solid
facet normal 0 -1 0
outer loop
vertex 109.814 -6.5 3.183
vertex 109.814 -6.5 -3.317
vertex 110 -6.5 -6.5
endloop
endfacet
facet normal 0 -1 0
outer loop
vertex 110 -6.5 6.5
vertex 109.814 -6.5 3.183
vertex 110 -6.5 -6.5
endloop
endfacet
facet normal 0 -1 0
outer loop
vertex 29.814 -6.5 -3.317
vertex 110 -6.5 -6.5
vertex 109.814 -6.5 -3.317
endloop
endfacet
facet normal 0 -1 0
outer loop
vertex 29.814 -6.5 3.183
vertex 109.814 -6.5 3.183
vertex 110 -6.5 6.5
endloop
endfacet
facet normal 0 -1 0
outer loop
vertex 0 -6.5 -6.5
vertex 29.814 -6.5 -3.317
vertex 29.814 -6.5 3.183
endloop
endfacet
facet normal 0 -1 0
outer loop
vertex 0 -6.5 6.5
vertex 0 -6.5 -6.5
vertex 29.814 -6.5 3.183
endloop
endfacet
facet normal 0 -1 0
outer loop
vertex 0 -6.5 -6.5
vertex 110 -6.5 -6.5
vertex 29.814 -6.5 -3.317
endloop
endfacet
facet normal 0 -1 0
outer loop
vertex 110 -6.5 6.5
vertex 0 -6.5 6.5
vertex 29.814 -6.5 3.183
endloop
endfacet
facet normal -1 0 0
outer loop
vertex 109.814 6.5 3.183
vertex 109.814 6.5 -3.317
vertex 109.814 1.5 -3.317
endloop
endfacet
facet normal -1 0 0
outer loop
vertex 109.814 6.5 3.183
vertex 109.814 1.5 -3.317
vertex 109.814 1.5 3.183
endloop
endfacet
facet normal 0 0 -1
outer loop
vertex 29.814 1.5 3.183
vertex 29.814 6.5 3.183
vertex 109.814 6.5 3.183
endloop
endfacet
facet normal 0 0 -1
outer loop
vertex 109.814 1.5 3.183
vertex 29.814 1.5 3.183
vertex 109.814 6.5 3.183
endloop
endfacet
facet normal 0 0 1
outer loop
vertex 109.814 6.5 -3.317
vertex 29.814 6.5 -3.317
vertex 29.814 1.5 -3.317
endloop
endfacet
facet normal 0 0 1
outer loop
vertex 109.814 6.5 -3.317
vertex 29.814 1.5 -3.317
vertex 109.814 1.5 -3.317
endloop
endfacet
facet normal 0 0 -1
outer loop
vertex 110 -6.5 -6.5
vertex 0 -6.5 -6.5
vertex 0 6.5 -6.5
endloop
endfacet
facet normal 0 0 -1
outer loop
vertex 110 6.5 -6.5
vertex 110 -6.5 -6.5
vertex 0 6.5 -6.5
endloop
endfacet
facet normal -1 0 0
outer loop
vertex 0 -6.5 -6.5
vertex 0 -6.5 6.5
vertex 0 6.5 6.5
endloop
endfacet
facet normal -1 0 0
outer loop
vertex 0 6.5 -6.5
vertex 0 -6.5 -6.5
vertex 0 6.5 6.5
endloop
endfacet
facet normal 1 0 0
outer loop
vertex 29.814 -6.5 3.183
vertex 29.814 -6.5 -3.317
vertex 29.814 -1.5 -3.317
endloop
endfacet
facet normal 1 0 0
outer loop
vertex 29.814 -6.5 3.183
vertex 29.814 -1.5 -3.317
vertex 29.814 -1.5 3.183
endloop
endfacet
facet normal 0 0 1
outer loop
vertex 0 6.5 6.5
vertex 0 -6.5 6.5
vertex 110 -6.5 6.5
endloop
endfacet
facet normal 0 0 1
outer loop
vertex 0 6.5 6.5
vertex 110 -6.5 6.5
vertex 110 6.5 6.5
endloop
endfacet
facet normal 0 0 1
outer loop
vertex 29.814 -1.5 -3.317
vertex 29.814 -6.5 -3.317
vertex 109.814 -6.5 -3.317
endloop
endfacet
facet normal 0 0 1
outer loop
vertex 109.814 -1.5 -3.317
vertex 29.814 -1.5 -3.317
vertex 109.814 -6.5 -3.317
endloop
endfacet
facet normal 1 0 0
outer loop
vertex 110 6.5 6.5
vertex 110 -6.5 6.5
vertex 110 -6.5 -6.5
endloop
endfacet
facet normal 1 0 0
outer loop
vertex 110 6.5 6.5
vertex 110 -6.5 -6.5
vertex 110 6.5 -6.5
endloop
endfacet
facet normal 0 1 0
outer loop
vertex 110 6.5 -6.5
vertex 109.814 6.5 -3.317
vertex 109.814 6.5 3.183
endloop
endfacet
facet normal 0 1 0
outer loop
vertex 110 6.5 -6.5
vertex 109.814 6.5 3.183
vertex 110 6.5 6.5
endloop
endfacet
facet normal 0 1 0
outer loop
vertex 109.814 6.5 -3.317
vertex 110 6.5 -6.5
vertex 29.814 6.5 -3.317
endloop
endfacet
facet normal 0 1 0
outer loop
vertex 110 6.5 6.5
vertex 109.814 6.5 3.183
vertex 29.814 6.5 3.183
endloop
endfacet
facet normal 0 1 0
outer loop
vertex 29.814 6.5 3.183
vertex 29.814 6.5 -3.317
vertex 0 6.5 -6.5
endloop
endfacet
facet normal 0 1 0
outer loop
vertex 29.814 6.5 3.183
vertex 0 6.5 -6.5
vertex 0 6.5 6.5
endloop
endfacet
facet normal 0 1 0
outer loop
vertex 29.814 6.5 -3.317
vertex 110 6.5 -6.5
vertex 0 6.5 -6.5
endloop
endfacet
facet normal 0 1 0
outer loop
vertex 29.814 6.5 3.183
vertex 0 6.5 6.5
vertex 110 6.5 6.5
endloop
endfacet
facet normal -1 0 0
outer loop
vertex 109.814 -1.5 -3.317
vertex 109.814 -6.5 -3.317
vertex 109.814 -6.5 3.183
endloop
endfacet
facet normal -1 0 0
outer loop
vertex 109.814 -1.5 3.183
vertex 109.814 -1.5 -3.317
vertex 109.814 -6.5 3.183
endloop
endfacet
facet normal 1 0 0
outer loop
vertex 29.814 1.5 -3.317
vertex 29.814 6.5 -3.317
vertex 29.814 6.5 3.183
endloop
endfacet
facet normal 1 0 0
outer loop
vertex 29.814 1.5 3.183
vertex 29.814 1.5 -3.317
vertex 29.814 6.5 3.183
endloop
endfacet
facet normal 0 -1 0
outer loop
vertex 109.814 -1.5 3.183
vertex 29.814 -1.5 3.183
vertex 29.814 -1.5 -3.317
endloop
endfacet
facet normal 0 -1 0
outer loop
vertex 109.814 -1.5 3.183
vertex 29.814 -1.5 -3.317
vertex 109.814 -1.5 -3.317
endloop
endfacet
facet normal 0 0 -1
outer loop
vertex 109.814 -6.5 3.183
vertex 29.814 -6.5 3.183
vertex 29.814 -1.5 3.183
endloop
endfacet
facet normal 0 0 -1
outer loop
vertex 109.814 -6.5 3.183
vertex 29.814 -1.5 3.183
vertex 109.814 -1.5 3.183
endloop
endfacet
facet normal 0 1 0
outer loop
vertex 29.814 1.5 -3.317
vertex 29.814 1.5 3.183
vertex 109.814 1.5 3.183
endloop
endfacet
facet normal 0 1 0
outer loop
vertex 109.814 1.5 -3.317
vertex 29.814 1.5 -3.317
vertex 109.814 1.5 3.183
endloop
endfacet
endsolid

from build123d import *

# Parameters (mm, degrees)
F0_W     = 13
F0_H     = 13
F1_DEPTH = 110
F2_W     = 80
F2_H     = 6.5
F3_DEPTH = 5


# Not quite as in the source:
# - a pattern or mirror of a feature is missing from the dataset's text; its kind, count and spacing are read off the source's solid


with BuildPart() as f1:
    # F0 (on Right) → F1 (new body)
    with BuildSketch(Plane.YZ):
        Rectangle(F0_W, F0_H)
    extrude(amount=F1_DEPTH)

    # F2 (on face) → F3 (cut)
    with BuildSketch(Plane.XZ.offset(6.5)):
        with Locations((69.8135038838, -0.0667710053)):
            Rectangle(F2_W, F2_H)
    f3 = extrude(amount=-F3_DEPTH, mode=Mode.SUBTRACT)

    # F3_copies: F3 across plane
    add(f3.mirror(Plane.ZX), mode=Mode.SUBTRACT)


solid = f1.part
